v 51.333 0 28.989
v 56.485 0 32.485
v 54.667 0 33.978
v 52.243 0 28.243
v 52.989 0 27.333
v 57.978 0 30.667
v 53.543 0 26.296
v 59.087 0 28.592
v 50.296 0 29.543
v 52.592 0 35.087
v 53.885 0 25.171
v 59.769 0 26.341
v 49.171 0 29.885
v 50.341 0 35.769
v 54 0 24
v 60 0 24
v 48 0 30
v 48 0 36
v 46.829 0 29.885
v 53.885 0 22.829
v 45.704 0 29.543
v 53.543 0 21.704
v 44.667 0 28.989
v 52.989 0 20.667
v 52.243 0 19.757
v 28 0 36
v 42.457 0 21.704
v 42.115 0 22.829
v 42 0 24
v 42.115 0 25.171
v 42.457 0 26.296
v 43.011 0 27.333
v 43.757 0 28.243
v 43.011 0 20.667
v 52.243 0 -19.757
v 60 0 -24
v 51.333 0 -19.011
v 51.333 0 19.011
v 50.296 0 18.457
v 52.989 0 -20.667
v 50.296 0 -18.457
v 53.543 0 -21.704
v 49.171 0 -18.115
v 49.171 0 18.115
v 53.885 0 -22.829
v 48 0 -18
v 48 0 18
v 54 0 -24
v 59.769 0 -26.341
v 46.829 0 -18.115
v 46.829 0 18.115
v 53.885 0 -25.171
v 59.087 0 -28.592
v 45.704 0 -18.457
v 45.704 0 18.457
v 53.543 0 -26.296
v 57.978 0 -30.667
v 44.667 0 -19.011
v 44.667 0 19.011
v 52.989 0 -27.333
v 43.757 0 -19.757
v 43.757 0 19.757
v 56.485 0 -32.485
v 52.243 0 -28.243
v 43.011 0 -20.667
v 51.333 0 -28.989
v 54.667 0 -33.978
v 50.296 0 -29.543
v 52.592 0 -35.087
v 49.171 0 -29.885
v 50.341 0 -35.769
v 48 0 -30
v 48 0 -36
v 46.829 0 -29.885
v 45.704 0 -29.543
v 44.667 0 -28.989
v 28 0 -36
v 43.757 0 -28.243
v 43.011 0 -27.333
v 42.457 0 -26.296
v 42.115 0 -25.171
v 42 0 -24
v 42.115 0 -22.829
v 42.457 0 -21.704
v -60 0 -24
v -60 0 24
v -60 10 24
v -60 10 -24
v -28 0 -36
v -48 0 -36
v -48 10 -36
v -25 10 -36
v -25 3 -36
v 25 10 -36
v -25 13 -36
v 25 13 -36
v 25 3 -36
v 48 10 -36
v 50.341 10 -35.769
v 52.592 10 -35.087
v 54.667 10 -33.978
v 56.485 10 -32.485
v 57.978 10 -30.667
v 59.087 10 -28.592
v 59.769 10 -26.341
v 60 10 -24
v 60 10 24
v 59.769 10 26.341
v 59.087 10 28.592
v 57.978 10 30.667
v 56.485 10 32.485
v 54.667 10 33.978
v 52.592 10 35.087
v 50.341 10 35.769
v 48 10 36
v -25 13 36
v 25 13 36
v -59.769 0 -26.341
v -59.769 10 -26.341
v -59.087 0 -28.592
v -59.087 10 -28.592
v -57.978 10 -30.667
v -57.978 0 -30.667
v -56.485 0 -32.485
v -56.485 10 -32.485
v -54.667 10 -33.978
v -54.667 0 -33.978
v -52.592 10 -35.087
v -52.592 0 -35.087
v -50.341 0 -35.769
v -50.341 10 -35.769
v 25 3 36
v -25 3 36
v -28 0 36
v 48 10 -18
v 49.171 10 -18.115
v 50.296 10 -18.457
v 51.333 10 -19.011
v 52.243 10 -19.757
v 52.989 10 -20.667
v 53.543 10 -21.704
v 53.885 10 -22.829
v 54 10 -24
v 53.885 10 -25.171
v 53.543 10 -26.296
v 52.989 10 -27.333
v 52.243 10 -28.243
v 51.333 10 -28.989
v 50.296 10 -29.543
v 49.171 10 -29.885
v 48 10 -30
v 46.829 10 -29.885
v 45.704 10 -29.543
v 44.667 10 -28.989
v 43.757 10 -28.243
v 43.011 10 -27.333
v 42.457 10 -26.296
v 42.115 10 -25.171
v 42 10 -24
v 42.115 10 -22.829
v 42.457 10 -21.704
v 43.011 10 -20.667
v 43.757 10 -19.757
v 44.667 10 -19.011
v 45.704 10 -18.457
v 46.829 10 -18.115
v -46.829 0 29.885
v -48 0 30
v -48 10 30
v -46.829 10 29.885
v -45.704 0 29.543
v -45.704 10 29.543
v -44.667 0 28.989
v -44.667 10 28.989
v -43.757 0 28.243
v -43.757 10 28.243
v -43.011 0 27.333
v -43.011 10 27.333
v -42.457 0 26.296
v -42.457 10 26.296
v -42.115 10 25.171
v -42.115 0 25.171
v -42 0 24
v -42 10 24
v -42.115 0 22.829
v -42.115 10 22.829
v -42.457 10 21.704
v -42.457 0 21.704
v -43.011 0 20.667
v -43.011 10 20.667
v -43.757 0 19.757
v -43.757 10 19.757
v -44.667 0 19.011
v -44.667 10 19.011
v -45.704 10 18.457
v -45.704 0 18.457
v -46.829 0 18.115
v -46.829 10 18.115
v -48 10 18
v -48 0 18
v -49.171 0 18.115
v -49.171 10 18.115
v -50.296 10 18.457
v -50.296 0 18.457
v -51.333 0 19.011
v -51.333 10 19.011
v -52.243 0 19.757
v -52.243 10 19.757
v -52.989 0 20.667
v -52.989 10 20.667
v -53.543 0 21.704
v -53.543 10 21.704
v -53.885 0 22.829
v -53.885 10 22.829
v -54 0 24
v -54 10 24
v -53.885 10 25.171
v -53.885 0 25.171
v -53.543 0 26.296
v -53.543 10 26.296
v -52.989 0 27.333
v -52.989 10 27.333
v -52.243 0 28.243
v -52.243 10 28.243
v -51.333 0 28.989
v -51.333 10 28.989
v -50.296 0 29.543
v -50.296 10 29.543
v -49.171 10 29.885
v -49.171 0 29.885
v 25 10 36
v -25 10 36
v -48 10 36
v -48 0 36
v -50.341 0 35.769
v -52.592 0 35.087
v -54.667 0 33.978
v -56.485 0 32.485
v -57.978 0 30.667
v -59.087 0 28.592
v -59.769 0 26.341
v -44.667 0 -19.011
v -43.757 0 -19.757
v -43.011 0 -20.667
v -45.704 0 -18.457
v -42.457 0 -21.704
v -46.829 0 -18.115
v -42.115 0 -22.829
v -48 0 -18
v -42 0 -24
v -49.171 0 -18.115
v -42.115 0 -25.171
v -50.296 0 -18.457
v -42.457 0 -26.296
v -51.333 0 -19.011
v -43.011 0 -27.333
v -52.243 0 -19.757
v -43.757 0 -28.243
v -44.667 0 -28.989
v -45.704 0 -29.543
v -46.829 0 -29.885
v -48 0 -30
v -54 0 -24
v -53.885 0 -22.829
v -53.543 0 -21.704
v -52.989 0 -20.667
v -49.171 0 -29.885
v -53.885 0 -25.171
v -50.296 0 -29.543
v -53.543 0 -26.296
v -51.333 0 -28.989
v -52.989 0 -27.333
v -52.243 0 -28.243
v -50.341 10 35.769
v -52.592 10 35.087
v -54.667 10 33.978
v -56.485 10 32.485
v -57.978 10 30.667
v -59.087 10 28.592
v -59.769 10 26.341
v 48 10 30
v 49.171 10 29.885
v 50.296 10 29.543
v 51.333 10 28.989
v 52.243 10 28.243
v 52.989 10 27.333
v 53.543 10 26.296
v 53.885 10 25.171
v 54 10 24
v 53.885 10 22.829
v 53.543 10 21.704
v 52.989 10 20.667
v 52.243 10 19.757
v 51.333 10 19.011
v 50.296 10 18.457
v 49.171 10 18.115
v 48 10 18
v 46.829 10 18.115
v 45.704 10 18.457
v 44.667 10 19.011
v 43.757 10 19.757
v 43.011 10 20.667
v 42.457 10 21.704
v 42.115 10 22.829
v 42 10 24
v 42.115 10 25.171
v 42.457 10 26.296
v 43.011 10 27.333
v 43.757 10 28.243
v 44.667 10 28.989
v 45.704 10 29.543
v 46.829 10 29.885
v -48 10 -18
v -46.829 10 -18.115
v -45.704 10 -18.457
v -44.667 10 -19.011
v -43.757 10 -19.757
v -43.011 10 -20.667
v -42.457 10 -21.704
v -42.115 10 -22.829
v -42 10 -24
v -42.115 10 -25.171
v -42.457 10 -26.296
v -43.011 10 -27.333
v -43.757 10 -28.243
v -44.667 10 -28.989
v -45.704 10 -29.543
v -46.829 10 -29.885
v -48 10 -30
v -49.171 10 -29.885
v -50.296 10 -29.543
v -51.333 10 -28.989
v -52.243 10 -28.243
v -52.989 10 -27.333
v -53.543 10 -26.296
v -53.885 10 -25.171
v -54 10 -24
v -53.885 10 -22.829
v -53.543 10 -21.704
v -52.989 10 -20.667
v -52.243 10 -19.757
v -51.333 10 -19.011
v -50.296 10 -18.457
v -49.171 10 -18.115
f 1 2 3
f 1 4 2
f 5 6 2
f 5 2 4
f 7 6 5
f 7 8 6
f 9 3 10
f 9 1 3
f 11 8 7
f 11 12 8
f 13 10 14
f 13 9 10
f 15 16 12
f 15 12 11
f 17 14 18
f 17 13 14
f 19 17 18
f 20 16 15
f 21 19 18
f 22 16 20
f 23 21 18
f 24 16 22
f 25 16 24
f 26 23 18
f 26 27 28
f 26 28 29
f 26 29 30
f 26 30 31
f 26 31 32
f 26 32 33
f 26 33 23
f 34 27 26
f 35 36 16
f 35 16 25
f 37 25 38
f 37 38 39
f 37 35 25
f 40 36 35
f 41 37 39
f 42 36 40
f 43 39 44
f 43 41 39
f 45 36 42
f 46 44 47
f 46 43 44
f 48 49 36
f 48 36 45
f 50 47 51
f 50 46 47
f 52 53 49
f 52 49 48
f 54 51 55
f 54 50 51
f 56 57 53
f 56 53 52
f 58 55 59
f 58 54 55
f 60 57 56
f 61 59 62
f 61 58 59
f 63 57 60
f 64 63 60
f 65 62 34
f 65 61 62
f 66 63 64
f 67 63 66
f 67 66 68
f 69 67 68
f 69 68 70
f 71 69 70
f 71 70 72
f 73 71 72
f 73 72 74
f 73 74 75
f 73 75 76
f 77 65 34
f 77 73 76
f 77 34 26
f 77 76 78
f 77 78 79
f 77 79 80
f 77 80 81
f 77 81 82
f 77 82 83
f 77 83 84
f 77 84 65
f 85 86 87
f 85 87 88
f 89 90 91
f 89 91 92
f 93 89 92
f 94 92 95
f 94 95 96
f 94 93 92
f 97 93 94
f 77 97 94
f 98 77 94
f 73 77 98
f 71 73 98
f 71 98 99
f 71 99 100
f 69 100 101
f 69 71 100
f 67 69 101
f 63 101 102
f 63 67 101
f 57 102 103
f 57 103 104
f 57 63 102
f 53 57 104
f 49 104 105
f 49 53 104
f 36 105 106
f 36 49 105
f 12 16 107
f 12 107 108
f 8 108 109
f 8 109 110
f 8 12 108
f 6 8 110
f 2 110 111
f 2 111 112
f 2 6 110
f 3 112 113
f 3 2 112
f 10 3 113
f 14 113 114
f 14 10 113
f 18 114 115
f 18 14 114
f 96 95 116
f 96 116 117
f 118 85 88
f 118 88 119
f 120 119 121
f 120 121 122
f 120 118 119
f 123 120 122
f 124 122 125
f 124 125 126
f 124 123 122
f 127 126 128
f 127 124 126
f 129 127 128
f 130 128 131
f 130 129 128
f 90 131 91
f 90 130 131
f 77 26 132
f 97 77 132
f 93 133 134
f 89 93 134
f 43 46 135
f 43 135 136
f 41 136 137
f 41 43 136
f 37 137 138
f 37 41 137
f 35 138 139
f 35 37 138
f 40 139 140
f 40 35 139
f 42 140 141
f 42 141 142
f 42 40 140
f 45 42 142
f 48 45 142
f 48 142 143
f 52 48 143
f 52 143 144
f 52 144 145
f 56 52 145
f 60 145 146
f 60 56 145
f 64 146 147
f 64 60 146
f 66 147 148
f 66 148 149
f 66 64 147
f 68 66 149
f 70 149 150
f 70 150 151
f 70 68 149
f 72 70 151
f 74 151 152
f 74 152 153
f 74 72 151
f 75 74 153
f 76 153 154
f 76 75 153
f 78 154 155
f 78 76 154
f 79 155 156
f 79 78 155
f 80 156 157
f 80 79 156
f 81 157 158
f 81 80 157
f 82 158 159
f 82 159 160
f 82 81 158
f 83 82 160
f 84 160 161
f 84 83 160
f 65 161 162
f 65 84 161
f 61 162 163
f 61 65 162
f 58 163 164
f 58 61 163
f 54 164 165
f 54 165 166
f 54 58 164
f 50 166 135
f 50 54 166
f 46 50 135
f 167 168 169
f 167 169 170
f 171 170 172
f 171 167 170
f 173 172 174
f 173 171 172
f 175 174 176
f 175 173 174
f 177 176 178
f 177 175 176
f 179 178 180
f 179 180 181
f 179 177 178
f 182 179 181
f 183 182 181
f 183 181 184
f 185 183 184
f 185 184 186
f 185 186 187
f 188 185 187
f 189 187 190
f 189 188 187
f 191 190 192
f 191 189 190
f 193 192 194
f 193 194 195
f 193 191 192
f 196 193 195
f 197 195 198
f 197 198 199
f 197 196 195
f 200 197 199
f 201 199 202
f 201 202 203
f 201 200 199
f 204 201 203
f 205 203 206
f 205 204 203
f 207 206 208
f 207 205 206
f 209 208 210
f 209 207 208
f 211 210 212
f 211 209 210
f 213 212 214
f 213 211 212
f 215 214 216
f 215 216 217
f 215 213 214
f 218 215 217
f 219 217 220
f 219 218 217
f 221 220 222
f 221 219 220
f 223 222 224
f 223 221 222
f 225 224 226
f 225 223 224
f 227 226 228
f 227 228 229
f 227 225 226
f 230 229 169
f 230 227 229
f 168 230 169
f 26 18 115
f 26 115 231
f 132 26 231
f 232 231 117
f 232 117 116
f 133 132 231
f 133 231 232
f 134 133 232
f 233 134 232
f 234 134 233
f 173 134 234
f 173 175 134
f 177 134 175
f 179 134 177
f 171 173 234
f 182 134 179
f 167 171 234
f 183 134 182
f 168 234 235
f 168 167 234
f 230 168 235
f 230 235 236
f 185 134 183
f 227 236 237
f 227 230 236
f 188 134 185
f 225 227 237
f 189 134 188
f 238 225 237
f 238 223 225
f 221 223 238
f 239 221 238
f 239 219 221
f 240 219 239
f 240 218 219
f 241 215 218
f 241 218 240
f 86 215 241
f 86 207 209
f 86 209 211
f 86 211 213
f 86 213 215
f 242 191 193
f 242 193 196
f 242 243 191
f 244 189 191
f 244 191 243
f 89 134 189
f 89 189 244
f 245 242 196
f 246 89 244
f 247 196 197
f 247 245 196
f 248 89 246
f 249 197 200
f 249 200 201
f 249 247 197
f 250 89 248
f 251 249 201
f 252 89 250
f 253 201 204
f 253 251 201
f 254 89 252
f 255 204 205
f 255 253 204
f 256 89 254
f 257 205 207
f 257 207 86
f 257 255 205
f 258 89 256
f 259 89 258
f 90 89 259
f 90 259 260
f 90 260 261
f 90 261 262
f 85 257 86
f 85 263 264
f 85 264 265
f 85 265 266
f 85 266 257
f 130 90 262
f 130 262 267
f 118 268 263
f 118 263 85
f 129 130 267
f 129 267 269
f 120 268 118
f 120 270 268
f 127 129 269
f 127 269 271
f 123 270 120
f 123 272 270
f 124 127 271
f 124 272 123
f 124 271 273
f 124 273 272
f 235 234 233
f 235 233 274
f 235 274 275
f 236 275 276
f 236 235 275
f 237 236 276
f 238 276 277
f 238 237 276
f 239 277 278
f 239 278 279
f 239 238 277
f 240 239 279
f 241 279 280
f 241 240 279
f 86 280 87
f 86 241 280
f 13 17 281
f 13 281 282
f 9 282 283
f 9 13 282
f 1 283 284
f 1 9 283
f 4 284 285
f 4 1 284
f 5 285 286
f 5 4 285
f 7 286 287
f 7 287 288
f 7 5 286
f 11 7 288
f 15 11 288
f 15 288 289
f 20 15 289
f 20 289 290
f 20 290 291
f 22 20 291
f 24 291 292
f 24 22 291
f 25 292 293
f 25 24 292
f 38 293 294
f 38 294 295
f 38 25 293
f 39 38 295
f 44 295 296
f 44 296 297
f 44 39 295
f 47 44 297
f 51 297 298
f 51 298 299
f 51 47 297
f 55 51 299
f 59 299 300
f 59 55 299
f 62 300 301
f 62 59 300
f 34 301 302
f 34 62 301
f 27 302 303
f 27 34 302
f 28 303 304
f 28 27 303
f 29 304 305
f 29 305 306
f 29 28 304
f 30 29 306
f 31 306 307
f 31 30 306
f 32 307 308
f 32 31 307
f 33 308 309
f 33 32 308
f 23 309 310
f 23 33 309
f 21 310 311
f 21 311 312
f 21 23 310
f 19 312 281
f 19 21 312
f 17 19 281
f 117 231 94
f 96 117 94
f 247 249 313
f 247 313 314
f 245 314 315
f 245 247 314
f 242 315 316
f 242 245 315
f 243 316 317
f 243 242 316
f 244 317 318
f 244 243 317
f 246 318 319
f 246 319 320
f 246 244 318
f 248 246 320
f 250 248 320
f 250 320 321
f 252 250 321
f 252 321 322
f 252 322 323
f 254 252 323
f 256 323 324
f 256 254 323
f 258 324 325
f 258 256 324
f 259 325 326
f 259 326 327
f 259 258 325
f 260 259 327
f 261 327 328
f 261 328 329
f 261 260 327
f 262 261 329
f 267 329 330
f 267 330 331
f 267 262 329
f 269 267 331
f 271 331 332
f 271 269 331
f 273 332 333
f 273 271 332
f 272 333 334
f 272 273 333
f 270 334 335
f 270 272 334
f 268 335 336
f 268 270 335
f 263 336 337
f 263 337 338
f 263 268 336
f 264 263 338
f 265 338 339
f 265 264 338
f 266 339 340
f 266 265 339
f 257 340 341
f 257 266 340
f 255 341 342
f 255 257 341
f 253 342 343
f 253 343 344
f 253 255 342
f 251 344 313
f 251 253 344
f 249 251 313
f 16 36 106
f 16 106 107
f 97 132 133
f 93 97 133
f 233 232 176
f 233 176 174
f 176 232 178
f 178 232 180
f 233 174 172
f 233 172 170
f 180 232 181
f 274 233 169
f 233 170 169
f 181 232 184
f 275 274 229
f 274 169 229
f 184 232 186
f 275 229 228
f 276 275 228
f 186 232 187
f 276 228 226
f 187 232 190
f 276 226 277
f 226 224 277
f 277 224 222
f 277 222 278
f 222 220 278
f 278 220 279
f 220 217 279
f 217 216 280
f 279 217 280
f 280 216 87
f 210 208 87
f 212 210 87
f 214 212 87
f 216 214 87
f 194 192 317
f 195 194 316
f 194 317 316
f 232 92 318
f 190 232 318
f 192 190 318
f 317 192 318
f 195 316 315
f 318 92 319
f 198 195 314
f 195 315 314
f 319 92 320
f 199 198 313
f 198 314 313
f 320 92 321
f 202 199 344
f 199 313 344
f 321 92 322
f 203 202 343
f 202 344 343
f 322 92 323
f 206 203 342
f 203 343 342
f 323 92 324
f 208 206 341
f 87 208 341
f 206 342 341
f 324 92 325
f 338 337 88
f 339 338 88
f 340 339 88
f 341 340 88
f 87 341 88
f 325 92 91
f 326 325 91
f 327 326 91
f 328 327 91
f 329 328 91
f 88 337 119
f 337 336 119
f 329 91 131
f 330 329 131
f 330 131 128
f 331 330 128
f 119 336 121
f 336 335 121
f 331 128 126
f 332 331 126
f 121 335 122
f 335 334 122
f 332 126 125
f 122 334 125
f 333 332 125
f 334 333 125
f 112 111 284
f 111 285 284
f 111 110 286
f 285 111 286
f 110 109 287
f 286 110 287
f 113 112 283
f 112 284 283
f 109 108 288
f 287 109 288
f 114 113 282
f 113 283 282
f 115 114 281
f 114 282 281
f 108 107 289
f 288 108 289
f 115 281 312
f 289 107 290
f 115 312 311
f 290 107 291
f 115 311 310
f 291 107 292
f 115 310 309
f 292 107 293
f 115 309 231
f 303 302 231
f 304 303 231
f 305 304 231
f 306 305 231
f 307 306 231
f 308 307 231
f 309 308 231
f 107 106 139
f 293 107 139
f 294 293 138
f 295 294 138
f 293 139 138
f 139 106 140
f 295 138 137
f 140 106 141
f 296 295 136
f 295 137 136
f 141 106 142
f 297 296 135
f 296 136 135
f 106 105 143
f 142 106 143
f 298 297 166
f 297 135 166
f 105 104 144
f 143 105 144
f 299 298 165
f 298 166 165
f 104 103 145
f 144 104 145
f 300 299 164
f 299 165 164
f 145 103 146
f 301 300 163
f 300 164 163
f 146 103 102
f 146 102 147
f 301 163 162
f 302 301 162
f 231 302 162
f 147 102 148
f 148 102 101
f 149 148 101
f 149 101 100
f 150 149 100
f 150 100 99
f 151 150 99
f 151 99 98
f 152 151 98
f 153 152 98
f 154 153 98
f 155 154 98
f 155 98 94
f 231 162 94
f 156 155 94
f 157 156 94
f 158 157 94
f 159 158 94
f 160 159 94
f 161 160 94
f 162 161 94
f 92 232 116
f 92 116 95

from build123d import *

# Parameters (mm, degrees)
SKETCH3_R           = 6
BOSS_EXTRUDE1_DEPTH = 10
SKETCH4_W           = 50
SKETCH4_H           = 72
BOSS_EXTRUDE2_DEPTH = 3
CUT_EXTRUDE1_DEPTH  = 95.620293806


with BuildPart() as part:
    # Sketch3 → Boss-Extrude1 (new body)
    with BuildSketch(Plane(origin=(0, 0, 0), x_dir=(1, 0, 0), z_dir=(0, 1, 0))):
        with BuildLine():
            Line((48, -36), (-48, -36))
            ThreePointArc((-48, -36), (-56.485281374, -32.485281374), (-60, -24))
            Line((-60, -24), (-60, 24))
            ThreePointArc((-60, 24), (-56.485281374, 32.485281374), (-48, 36))
            Line((-48, 36), (48, 36))
            ThreePointArc((48, 36), (56.485281374, 32.485281374), (60, 24))
            Line((60, 24), (60, -24))
            ThreePointArc((60, -24), (56.485281374, -32.485281374), (48, -36))
        make_face()
        with Locations(Location((-48, 24, 0), (0, 0, 270))):
            Circle(SKETCH3_R, mode=Mode.SUBTRACT)
        with Locations(Location((-48, -24, 0), (0, 0, 270))):
            Circle(SKETCH3_R, mode=Mode.SUBTRACT)
        with Locations(Location((48, -24, 0), (0, 0, 270))):
            Circle(SKETCH3_R, mode=Mode.SUBTRACT)
        with Locations(Location((48, 24, 0), (0, 0, 270))):
            Circle(SKETCH3_R, mode=Mode.SUBTRACT)
    extrude(amount=BOSS_EXTRUDE1_DEPTH)

    # Sketch4 → Boss-Extrude2 (add)
    with BuildSketch(Plane(origin=(0, 10, 0), x_dir=(1, 0, 0), z_dir=(0, 1, 0))):
        Rectangle(SKETCH4_W, SKETCH4_H)
    extrude(amount=BOSS_EXTRUDE2_DEPTH)

    # Sketch5 → Cut-Extrude1 (cut, through all)
    with BuildSketch(Plane.XY.offset(36)):
        Polygon((0, 0), (28, 0), (25, 3), (-25, 3), (-28, 0), align=None)
    extrude(amount=-CUT_EXTRUDE1_DEPTH, mode=Mode.SUBTRACT)


solid = part.part
